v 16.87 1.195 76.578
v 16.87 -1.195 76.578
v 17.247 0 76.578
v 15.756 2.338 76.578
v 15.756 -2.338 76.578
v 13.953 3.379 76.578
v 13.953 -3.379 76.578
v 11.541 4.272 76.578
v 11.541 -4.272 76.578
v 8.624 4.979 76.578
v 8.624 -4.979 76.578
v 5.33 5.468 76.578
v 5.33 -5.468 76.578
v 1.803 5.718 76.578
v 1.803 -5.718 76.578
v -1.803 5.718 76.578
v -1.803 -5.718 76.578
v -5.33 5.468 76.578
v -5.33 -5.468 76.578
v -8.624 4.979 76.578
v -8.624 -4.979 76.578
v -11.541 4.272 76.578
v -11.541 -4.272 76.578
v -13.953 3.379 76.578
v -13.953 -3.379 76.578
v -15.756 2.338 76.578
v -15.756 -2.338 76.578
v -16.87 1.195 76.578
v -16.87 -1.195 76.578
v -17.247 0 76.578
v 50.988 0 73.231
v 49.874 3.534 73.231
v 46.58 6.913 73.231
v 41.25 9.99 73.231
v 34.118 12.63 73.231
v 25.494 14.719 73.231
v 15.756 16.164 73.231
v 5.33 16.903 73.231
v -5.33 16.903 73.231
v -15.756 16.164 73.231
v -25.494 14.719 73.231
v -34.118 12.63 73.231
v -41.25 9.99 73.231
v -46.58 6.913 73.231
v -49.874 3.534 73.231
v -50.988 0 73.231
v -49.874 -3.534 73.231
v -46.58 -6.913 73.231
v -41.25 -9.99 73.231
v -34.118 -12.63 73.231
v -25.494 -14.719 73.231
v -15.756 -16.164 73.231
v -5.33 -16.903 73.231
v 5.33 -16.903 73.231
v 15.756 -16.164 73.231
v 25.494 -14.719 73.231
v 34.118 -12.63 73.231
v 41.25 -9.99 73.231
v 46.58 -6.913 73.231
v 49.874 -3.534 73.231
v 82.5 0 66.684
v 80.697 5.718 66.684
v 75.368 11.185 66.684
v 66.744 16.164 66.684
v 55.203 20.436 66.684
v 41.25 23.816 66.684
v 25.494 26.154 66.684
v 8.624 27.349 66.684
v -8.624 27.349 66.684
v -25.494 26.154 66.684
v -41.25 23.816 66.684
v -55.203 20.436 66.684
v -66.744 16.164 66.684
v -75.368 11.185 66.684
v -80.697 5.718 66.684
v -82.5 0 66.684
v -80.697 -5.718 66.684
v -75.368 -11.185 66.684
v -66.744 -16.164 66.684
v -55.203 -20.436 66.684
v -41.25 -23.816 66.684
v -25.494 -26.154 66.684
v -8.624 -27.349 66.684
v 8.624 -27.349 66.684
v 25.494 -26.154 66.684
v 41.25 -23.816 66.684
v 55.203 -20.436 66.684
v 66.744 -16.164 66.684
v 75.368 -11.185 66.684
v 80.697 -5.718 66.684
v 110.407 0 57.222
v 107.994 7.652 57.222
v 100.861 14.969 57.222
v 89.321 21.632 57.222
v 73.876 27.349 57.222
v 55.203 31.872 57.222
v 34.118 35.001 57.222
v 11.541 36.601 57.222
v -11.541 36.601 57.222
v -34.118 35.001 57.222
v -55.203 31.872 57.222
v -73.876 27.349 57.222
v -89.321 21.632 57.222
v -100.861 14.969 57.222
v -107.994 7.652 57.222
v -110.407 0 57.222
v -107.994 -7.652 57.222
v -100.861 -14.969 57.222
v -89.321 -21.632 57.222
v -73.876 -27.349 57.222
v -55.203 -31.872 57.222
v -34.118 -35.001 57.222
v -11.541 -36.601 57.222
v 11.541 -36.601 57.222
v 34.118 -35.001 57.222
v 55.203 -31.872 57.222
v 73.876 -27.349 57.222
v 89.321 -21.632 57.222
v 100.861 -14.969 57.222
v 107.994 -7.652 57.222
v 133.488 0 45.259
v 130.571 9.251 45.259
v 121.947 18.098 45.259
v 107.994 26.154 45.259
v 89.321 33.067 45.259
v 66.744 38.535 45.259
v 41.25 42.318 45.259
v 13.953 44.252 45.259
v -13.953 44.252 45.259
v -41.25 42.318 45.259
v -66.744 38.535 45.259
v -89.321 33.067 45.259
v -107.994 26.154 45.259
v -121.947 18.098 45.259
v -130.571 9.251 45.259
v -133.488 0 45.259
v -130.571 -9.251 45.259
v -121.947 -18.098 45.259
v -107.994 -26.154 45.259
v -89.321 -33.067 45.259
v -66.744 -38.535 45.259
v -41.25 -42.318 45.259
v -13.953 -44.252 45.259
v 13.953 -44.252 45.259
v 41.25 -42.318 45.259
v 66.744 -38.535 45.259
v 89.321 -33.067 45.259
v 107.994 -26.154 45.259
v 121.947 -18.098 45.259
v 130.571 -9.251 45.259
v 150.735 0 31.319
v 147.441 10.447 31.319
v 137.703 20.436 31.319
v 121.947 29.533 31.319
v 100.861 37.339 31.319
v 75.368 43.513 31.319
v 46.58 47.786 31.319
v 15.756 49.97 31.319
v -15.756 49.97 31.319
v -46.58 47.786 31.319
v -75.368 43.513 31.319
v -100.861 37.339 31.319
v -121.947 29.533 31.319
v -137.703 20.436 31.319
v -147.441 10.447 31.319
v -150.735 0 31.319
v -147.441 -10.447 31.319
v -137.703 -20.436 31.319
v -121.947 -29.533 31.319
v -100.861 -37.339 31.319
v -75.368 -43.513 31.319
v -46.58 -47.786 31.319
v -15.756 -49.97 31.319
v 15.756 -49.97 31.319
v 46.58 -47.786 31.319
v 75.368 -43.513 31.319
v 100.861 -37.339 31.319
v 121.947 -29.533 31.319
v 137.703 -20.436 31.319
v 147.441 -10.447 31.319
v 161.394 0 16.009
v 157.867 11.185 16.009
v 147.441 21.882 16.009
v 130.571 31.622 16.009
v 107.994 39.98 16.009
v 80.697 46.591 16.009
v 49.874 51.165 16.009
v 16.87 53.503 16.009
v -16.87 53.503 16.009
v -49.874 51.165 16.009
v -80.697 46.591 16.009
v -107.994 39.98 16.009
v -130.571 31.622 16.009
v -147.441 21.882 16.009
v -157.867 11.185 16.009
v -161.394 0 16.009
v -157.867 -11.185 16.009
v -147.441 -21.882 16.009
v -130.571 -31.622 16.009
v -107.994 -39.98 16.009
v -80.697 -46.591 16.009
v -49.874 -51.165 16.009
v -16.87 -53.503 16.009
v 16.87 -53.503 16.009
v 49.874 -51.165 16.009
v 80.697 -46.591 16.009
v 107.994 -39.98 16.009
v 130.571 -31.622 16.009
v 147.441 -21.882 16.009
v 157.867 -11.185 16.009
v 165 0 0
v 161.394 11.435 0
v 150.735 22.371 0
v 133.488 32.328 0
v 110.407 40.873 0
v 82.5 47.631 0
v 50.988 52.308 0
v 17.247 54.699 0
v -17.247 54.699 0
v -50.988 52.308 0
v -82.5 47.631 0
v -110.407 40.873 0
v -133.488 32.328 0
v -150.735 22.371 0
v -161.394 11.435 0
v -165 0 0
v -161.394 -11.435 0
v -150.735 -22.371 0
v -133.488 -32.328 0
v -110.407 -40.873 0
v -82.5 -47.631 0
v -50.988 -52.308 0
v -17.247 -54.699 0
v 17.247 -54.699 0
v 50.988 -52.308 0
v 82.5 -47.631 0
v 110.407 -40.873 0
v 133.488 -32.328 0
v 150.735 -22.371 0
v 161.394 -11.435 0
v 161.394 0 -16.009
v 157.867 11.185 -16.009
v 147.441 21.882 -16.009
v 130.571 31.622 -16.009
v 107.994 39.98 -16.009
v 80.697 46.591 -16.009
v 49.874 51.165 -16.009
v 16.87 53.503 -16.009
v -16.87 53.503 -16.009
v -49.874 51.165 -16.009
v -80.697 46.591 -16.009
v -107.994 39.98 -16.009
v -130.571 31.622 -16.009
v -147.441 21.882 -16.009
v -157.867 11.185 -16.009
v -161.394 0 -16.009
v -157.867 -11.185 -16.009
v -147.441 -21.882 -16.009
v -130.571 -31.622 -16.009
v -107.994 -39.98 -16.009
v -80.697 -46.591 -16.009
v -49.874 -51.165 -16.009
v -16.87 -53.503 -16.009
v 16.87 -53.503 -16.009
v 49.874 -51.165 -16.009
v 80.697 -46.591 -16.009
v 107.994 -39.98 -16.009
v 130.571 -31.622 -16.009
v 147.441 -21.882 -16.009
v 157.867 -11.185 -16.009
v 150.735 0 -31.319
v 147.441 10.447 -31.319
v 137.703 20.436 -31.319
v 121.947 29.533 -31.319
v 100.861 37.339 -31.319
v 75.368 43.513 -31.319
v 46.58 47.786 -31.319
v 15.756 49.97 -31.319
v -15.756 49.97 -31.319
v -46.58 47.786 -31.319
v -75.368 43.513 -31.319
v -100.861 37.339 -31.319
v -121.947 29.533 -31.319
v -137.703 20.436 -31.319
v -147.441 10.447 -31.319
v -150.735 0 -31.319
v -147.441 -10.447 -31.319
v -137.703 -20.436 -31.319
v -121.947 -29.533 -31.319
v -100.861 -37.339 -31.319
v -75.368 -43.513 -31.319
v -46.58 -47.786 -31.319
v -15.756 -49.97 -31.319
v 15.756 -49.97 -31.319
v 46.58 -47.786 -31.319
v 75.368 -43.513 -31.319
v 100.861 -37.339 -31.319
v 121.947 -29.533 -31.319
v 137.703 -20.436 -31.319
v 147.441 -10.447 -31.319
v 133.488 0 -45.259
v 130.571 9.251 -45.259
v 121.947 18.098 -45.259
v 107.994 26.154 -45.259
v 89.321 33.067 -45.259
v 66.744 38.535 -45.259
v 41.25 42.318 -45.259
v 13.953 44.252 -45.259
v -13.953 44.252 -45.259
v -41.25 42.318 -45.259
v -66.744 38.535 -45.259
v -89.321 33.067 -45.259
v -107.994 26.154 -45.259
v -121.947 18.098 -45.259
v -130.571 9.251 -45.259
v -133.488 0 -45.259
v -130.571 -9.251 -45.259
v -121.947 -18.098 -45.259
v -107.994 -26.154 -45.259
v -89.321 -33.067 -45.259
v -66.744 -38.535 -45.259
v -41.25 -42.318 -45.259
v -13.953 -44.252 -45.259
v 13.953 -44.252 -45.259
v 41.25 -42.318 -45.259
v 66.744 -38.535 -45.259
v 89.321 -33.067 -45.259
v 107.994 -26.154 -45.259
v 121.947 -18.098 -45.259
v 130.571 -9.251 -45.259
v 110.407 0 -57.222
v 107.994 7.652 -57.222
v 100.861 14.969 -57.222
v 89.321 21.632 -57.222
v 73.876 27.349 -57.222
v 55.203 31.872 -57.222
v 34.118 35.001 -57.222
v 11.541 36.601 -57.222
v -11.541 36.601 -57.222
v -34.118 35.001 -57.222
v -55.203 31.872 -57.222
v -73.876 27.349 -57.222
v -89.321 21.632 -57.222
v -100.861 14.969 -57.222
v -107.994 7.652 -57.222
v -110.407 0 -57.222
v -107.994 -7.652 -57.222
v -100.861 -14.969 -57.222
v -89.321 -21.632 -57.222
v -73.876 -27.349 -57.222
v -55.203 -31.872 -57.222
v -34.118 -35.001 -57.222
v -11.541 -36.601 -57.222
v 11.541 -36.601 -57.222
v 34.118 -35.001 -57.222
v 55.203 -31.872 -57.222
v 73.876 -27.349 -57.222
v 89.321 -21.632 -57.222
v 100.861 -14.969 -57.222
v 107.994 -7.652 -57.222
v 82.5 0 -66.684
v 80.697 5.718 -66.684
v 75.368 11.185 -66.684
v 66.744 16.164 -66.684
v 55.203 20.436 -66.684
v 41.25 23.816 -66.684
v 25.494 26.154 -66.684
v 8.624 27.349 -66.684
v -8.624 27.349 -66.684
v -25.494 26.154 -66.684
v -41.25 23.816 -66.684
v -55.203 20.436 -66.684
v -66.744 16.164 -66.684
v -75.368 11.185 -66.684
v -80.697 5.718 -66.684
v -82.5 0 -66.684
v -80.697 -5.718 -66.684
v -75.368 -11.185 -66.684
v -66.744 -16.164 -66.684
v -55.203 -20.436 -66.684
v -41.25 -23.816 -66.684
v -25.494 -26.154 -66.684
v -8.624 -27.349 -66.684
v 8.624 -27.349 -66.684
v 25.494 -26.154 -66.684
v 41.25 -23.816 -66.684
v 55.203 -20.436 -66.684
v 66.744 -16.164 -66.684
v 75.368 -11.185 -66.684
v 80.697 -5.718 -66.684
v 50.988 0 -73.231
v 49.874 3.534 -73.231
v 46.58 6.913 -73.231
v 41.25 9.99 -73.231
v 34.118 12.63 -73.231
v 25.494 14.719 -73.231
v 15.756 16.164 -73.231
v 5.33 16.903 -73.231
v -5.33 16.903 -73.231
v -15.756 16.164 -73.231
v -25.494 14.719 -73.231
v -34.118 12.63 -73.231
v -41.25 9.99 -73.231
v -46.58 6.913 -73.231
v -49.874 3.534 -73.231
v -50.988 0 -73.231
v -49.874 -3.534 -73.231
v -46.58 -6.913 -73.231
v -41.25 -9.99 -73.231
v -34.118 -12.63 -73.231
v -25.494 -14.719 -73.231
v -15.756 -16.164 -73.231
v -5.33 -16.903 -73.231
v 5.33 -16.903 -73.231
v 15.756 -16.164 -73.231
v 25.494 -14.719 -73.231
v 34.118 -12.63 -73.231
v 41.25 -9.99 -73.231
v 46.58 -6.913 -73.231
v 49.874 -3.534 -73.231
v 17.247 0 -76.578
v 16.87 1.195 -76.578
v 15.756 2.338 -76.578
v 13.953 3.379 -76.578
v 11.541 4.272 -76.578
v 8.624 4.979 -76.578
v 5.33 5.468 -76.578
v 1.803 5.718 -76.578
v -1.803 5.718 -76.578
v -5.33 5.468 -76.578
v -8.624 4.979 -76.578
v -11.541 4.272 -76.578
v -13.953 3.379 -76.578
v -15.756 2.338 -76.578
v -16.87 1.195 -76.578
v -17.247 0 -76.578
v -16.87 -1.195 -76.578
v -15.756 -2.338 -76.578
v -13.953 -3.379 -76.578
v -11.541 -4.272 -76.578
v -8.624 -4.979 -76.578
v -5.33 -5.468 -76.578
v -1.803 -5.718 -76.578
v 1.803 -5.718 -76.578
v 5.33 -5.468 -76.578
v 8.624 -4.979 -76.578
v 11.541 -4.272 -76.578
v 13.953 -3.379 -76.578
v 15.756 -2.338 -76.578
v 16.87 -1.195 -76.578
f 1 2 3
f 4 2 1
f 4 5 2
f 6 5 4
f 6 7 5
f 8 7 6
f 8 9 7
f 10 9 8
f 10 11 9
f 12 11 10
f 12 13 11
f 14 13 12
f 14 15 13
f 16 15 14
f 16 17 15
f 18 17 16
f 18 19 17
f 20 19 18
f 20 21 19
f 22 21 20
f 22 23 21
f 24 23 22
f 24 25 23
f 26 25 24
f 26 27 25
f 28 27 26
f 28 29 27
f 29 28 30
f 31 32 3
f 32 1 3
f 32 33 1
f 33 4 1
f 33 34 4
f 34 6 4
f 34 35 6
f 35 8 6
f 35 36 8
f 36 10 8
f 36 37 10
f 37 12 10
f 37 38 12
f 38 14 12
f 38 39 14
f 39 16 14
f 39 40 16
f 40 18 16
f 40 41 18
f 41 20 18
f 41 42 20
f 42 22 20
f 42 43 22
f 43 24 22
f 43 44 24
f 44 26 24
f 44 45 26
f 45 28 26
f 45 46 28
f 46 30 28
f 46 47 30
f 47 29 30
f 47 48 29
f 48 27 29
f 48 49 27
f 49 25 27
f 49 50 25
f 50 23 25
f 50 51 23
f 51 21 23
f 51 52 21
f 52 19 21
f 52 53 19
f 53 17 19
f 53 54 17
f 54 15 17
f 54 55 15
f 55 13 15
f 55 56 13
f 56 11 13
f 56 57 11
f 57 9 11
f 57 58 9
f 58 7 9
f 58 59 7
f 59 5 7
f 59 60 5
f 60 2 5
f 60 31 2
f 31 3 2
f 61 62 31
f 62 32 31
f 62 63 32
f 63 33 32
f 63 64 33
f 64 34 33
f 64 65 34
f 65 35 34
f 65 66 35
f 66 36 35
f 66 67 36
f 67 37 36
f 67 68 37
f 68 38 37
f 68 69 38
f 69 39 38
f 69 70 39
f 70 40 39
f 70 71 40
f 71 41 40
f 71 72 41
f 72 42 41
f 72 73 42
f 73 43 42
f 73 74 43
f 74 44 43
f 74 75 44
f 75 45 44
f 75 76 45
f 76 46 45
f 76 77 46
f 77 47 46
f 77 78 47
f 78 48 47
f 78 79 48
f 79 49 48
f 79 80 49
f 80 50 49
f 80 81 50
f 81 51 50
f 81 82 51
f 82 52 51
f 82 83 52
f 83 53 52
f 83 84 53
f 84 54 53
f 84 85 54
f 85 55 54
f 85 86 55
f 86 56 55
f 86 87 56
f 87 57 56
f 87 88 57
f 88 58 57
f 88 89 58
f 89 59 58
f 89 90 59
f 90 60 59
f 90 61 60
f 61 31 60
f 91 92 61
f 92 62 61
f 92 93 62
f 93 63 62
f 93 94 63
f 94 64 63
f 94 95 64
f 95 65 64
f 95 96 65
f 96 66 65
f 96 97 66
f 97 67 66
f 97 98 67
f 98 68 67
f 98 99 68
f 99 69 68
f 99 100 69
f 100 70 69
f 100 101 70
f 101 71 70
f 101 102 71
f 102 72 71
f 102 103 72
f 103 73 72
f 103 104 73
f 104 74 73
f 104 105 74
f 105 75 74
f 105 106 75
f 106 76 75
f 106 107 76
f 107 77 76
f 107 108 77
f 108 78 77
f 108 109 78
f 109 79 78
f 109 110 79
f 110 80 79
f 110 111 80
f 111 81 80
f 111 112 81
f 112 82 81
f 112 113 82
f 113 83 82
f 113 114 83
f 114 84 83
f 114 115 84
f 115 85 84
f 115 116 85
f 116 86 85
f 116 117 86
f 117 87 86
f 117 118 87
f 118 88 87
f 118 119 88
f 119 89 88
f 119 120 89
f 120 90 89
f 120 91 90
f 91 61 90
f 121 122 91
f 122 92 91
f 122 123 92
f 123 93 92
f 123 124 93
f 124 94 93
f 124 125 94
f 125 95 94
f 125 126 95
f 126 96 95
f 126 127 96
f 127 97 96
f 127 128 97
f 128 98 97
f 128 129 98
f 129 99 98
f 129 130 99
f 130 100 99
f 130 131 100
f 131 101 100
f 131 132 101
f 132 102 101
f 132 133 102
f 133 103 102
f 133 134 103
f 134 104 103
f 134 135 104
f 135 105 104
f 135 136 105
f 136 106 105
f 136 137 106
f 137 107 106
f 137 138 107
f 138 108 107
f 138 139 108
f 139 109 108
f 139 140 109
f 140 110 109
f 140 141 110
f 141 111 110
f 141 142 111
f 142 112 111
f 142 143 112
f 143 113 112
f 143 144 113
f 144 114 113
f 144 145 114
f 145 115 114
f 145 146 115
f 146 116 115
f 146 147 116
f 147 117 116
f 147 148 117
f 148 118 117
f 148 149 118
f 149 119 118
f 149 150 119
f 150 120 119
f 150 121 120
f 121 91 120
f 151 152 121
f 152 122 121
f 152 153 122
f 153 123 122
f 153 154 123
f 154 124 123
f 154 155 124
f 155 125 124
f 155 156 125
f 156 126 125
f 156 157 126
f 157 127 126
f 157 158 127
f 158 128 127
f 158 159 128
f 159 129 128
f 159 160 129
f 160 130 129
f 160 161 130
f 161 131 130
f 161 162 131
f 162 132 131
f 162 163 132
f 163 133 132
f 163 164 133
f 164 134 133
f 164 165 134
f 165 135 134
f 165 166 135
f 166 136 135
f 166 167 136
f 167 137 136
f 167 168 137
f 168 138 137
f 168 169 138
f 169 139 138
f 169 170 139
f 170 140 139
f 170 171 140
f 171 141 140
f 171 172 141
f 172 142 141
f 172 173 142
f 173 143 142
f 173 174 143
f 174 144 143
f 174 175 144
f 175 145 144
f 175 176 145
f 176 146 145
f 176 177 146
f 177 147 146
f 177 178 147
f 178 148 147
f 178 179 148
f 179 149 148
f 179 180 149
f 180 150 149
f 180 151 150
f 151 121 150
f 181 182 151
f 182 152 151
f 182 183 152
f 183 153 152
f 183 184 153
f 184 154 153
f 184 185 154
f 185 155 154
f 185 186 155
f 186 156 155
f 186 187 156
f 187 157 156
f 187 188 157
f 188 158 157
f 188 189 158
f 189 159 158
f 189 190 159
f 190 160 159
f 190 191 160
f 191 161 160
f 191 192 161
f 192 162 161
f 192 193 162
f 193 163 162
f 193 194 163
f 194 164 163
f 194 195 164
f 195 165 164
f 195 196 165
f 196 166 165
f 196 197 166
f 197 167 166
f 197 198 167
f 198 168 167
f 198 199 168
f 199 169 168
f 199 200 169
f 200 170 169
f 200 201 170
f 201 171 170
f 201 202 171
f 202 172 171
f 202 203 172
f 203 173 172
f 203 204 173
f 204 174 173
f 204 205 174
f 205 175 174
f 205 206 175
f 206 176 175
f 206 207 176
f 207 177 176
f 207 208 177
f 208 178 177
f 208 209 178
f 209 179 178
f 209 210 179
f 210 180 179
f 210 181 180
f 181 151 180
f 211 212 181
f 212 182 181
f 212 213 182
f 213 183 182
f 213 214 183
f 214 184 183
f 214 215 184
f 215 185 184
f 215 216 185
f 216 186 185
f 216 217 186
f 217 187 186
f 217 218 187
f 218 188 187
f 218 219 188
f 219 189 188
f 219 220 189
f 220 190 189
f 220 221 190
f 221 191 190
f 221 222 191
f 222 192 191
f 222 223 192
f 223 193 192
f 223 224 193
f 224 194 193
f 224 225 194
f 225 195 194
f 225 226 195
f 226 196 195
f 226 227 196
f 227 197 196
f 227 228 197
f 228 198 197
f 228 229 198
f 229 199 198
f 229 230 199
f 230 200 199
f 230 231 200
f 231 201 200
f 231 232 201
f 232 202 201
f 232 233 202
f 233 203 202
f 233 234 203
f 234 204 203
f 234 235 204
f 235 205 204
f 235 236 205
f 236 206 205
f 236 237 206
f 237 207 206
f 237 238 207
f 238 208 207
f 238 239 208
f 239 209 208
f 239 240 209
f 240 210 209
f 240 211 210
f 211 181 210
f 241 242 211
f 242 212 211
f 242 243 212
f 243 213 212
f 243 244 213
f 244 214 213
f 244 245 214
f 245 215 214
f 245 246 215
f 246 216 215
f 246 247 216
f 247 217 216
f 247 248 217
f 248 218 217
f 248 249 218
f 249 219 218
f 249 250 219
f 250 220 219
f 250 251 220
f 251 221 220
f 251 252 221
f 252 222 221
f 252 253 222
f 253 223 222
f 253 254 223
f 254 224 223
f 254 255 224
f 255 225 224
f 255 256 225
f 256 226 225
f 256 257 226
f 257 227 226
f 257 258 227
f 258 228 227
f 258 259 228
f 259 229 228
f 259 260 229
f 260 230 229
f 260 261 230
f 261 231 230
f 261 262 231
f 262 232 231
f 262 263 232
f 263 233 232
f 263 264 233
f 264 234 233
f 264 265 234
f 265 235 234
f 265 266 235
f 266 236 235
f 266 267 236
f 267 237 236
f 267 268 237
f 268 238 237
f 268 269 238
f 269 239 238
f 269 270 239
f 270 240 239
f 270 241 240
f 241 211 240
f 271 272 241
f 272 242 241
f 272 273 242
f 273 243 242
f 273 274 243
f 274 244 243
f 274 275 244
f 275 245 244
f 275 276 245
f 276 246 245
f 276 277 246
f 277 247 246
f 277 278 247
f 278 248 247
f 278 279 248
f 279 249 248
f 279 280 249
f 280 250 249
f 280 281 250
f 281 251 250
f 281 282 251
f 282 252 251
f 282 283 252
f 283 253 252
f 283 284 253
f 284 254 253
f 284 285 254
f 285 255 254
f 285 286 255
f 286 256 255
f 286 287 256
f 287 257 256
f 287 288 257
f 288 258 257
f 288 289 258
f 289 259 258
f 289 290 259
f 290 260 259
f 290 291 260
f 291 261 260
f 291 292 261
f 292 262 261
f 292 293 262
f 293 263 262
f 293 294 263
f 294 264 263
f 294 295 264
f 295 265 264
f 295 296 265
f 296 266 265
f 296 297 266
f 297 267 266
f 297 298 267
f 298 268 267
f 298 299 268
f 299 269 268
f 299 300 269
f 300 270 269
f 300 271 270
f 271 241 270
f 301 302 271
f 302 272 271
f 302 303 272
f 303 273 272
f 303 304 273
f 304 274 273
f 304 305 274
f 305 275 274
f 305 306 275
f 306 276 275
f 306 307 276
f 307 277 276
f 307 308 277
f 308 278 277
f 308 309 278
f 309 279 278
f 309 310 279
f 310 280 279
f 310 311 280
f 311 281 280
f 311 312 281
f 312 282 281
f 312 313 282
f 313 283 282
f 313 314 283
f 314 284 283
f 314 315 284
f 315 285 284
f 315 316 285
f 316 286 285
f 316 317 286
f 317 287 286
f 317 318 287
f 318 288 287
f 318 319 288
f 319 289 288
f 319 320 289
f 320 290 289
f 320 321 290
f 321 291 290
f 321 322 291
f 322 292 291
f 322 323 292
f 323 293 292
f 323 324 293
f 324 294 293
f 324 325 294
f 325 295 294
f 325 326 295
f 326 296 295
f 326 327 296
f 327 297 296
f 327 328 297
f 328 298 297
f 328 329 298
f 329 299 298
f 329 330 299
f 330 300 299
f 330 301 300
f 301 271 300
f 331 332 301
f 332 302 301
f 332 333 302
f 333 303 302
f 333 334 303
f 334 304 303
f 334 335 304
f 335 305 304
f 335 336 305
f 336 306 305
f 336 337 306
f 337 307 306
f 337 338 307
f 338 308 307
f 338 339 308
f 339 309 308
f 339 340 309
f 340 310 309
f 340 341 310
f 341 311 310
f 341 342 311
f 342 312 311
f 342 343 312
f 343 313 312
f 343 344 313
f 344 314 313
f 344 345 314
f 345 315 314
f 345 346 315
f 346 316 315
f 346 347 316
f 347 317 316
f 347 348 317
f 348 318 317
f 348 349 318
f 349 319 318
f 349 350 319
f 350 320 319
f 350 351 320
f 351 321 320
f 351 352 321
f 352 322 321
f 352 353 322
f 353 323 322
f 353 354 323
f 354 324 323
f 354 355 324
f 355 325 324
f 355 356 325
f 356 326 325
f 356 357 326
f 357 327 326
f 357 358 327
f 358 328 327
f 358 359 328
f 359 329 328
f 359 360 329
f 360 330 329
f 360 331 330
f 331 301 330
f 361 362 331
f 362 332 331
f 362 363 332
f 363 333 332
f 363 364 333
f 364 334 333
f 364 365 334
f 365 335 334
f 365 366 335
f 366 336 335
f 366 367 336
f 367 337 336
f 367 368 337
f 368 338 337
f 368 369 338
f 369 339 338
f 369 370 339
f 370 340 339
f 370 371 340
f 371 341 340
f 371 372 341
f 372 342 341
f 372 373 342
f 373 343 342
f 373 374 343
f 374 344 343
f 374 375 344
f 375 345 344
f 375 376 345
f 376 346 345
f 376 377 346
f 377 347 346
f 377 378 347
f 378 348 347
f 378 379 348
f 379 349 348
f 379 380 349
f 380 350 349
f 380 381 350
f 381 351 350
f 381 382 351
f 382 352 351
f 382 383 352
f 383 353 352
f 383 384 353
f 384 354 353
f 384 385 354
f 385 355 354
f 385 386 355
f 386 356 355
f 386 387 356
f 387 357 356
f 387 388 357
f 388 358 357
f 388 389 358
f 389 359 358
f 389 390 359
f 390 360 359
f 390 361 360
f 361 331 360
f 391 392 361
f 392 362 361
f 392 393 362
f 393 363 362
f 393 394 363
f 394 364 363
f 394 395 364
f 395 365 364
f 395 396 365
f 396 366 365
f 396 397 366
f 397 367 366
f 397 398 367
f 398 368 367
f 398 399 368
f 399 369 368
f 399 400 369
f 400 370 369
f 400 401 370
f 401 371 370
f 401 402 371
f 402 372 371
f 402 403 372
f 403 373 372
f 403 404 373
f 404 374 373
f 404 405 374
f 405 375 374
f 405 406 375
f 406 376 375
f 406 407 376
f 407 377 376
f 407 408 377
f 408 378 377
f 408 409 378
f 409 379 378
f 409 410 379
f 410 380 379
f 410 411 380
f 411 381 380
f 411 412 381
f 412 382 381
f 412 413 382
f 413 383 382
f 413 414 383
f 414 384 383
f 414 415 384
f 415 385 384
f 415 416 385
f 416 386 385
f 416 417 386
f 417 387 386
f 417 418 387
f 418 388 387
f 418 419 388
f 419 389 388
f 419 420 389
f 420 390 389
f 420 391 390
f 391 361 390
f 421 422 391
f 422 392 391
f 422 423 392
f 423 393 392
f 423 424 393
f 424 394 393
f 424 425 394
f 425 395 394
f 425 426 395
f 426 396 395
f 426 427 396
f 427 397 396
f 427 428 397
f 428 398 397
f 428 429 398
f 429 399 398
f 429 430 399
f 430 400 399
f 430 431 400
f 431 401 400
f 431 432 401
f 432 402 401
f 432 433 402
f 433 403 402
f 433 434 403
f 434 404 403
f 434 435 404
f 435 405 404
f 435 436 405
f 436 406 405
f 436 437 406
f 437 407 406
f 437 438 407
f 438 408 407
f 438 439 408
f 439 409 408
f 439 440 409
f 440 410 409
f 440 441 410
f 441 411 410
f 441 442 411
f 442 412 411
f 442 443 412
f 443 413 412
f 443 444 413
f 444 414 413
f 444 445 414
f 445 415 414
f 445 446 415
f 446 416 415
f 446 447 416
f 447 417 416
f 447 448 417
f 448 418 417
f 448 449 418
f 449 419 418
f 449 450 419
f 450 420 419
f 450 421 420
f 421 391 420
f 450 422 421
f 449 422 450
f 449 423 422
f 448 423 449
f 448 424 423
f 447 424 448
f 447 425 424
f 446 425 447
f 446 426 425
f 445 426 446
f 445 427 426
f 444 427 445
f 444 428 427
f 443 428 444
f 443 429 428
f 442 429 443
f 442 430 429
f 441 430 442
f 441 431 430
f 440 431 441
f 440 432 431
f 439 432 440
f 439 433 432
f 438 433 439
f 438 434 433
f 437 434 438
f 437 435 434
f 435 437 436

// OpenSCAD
// Generated by SolidPython 1.0.1 on 2020-07-29 00:46:51


scale(v = [15, 5, 7]) {
	sphere(r = 11);
}
/***********************************************
*********      SolidPython code:      **********
************************************************
 
# import packages: SolidPython
from solid import *
from solid.utils import *
from itertools import chain, combinations, permutations


class Resize:

    def __init__(self, scad_file):
        self.scad_file = scad_file
        #self.scad_file = import_scad(scad_file)
        # cone/cylinder param:
        self.r1 = 0
        self.r2 = 0
        self.h = 0
        # rectangular prism param:
        self.w = 0
        self.l = 0
        # ellipse param:
        self.r = 0

    # import OpenScad code (file name corresponds to shape)


    # classify shape + parameters
    def assign(self, param1, param2, param3):
        if self.scad_file == 'cone.scad':
            self.r1 = param1
            self.r2 = param2
            self.h = param3
        elif self.scad_file == 'cylinder.scad':
            self.r1 = param1
            self.r2 = param2
            self.h = param3
        elif self.scad_file == 'rectangularPrism.scad':
            self.h = param1
            self.l = param2
            self.w = param3
        else:
            self.r = param1
            self.h = param2

    # resize parameters
    def iterate(self):
        x = range(3, 20, 2)
        i = 1
        if self.scad_file == 'cone.scad':
            tempList = list(permutations(x, 2))
            for temp in tempList:
                param1 = temp[0]
                param2 = temp[1]
                filepath = 'produced_scad_files/' + 'cone' + str(param1) + '_' + str(param2) + '_' + '.scad'
                scad_render_to_file(cylinder(h=param1, r1=param2, r2=0), filepath)

        elif self.scad_file == 'cylinder.scad':
            tempList = list(permutations(x, 3))
            for temp in tempList:
                param1 = temp[0]
                param2 = temp[1]
                filepath = 'produced_scad_files/' + 'cylinder' + str(param1) + '_' + str(param2) + '_' + '.scad'
                scad_render_to_file(cylinder(h=param1, r1=param2, r2=param2), filepath)

        elif self.scad_file == 'rectangularPrism.scad':
            tempList = list(permutations(x, 3))
            for temp in tempList:
                param1 = temp[0]
                param2 = temp[1]
                param3 = temp[2]
                filepath = 'produced_scad_files/' + 'rectangularPrism' + str(param1) + '_' + str(param2) + '_' + str(
                    param3) + '.scad'
                scad_render_to_file(cube(size=(param1, param2, param3)), filepath)

        elif self.scad_file == 'ellipse.scad':
            tempList = list(permutations(x, 4))
            for temp in tempList:
                param1 = temp[0]
                param2 = temp[1]
                param3 = temp[2]
                param4 = temp[3]
                filepath = 'produced_scad_files/' + 'ellipse' + str(param1) + '_' + str(param2) + '_' + str(param3) + '_' + str(param4) + '.scad'
                scad_render_to_file(scale([param1, param2, param3])(sphere(r=param4)), filepath)

    def render_to_scadfile(self):
        scad_render_to_file(scad, 'example.scad') 
 
************************************************/
